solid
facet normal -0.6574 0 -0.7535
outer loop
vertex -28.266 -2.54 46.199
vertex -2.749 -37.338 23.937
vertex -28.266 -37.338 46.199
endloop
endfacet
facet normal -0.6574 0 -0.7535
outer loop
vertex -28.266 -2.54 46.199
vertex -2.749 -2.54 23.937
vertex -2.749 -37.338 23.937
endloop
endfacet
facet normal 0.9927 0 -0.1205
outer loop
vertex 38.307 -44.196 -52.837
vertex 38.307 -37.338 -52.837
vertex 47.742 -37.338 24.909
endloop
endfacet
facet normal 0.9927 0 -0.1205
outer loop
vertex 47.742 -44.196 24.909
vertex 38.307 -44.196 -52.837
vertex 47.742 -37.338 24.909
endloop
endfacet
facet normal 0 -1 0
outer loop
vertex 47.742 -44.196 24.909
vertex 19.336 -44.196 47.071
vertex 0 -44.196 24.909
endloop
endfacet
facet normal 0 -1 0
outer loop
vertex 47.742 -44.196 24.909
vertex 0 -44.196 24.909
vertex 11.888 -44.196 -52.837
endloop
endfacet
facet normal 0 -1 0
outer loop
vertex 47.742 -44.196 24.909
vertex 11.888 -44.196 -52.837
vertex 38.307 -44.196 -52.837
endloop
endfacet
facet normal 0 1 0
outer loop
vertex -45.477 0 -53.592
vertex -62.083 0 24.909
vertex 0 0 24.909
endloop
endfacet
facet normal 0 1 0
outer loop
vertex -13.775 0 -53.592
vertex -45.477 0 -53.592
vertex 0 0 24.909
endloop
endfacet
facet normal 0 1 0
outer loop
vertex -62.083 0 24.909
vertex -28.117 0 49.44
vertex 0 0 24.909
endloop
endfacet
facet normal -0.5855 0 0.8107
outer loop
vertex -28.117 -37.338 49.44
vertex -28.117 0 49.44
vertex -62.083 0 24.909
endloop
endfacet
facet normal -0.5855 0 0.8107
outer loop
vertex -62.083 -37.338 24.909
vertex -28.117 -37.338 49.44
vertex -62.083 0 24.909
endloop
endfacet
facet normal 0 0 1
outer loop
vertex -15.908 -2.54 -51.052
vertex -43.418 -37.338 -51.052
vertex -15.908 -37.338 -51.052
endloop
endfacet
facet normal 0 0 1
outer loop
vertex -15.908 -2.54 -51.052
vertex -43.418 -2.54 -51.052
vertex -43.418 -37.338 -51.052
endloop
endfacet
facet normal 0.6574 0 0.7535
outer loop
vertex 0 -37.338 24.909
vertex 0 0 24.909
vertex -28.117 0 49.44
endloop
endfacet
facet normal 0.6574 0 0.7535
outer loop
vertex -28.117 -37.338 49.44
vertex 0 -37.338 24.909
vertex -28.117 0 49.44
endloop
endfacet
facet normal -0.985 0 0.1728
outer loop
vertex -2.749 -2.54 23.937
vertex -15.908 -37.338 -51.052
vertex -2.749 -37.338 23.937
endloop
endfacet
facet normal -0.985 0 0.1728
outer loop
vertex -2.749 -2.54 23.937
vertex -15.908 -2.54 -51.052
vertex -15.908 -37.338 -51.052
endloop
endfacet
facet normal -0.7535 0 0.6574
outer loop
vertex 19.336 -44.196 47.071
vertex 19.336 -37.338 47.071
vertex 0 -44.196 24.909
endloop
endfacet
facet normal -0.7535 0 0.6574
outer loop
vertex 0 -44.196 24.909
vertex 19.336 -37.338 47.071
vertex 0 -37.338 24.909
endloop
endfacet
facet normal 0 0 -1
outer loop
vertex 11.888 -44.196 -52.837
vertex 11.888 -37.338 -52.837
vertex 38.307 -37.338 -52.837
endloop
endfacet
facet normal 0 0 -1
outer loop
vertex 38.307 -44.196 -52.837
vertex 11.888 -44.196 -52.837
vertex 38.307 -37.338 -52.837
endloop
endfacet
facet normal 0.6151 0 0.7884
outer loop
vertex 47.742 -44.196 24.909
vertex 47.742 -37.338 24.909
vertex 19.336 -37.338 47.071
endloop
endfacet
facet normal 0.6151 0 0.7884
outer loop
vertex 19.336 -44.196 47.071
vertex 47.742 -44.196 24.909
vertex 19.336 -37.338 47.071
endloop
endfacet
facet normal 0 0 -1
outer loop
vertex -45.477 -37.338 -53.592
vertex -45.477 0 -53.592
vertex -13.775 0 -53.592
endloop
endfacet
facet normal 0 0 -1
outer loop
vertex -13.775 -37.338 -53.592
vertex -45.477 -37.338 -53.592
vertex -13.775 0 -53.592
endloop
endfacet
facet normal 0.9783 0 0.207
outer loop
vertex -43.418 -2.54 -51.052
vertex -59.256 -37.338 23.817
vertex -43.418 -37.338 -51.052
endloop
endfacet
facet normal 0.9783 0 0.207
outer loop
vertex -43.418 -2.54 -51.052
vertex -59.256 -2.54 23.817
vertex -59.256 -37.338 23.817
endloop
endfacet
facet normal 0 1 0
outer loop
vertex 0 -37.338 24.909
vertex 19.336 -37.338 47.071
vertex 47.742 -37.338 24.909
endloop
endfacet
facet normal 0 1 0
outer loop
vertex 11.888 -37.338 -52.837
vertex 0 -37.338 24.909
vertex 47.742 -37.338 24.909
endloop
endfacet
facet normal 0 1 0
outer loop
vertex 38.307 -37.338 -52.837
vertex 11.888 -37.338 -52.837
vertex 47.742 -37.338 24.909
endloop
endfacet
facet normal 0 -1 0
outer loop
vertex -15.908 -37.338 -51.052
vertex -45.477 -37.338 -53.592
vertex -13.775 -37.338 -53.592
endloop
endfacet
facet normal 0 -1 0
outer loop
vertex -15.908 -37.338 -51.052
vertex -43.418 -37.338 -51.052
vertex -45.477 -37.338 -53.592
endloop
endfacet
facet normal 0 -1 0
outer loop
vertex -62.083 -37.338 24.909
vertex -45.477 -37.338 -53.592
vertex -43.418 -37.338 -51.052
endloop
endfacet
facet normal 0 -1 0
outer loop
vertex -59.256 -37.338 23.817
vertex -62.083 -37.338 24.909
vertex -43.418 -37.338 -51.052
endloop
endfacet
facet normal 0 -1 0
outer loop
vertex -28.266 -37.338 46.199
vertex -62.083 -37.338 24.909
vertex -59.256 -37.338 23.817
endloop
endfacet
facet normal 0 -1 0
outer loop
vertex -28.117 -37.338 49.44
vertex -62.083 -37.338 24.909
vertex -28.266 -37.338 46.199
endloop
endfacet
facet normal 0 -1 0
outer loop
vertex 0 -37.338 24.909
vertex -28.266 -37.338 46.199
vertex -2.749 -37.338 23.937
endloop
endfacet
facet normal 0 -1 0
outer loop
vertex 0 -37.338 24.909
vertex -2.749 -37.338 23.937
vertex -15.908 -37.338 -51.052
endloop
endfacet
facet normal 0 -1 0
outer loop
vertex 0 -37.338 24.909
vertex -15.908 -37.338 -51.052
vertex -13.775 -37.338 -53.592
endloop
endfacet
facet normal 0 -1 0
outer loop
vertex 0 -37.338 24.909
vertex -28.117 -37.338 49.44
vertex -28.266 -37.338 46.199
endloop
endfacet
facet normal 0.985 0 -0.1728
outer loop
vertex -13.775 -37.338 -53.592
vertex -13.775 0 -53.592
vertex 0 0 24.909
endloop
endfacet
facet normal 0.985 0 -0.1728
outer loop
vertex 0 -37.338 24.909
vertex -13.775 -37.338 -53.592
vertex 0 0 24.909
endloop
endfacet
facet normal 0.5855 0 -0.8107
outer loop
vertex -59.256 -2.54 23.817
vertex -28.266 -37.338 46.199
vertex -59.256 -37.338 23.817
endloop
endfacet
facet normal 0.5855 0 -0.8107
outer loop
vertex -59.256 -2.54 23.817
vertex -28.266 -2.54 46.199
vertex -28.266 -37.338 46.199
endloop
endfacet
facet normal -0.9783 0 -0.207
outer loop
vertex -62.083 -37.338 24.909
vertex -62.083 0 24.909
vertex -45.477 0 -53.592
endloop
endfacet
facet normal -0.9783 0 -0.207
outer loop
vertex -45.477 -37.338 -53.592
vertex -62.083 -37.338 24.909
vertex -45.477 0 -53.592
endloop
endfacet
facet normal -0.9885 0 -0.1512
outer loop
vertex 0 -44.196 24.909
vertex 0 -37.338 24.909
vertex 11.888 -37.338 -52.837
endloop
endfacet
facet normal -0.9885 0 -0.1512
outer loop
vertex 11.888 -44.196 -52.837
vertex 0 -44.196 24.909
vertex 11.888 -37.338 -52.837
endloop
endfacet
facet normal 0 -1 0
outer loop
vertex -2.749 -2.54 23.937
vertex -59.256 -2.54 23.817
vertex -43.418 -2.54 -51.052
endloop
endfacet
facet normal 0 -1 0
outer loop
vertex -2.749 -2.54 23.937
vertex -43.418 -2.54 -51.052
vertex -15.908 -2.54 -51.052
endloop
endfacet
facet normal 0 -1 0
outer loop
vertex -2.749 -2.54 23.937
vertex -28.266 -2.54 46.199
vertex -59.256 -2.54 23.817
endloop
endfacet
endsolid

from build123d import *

# Parameters (mm, degrees)
F1_DEPTH = 37.338
F2_T     = -2.54
F4_DEPTH = 6.858


with BuildPart() as f1:
    # F0 (on Front) → F1 (new body)
    with BuildSketch(Plane.XZ):
        Polygon((-62.083233, 24.908774), (-45.477383, -53.591605), (-13.775306, -53.591605), (0, 24.908774), (-28.116722, 49.440142), align=None)
    extrude(amount=F1_DEPTH)

    # F2
    f2_openings = [f1.faces().sort_by_distance(p)[0] for p in [
        (-30.351472, -37.338, -2.700199),
    ]]
    offset(amount=F2_T, openings=f2_openings)


with BuildPart() as f4:
    # F3 (on face) → F4 (new body)
    with BuildSketch(Plane.XZ.offset(37.338)):
        Polygon((19.335996, 47.0708), (0, 24.908774), (11.888279, -52.836794), (38.306672, -52.836794), (47.741815, 24.908774), align=None)
    extrude(amount=F4_DEPTH)


solid = Compound([f1.part, f4.part])
